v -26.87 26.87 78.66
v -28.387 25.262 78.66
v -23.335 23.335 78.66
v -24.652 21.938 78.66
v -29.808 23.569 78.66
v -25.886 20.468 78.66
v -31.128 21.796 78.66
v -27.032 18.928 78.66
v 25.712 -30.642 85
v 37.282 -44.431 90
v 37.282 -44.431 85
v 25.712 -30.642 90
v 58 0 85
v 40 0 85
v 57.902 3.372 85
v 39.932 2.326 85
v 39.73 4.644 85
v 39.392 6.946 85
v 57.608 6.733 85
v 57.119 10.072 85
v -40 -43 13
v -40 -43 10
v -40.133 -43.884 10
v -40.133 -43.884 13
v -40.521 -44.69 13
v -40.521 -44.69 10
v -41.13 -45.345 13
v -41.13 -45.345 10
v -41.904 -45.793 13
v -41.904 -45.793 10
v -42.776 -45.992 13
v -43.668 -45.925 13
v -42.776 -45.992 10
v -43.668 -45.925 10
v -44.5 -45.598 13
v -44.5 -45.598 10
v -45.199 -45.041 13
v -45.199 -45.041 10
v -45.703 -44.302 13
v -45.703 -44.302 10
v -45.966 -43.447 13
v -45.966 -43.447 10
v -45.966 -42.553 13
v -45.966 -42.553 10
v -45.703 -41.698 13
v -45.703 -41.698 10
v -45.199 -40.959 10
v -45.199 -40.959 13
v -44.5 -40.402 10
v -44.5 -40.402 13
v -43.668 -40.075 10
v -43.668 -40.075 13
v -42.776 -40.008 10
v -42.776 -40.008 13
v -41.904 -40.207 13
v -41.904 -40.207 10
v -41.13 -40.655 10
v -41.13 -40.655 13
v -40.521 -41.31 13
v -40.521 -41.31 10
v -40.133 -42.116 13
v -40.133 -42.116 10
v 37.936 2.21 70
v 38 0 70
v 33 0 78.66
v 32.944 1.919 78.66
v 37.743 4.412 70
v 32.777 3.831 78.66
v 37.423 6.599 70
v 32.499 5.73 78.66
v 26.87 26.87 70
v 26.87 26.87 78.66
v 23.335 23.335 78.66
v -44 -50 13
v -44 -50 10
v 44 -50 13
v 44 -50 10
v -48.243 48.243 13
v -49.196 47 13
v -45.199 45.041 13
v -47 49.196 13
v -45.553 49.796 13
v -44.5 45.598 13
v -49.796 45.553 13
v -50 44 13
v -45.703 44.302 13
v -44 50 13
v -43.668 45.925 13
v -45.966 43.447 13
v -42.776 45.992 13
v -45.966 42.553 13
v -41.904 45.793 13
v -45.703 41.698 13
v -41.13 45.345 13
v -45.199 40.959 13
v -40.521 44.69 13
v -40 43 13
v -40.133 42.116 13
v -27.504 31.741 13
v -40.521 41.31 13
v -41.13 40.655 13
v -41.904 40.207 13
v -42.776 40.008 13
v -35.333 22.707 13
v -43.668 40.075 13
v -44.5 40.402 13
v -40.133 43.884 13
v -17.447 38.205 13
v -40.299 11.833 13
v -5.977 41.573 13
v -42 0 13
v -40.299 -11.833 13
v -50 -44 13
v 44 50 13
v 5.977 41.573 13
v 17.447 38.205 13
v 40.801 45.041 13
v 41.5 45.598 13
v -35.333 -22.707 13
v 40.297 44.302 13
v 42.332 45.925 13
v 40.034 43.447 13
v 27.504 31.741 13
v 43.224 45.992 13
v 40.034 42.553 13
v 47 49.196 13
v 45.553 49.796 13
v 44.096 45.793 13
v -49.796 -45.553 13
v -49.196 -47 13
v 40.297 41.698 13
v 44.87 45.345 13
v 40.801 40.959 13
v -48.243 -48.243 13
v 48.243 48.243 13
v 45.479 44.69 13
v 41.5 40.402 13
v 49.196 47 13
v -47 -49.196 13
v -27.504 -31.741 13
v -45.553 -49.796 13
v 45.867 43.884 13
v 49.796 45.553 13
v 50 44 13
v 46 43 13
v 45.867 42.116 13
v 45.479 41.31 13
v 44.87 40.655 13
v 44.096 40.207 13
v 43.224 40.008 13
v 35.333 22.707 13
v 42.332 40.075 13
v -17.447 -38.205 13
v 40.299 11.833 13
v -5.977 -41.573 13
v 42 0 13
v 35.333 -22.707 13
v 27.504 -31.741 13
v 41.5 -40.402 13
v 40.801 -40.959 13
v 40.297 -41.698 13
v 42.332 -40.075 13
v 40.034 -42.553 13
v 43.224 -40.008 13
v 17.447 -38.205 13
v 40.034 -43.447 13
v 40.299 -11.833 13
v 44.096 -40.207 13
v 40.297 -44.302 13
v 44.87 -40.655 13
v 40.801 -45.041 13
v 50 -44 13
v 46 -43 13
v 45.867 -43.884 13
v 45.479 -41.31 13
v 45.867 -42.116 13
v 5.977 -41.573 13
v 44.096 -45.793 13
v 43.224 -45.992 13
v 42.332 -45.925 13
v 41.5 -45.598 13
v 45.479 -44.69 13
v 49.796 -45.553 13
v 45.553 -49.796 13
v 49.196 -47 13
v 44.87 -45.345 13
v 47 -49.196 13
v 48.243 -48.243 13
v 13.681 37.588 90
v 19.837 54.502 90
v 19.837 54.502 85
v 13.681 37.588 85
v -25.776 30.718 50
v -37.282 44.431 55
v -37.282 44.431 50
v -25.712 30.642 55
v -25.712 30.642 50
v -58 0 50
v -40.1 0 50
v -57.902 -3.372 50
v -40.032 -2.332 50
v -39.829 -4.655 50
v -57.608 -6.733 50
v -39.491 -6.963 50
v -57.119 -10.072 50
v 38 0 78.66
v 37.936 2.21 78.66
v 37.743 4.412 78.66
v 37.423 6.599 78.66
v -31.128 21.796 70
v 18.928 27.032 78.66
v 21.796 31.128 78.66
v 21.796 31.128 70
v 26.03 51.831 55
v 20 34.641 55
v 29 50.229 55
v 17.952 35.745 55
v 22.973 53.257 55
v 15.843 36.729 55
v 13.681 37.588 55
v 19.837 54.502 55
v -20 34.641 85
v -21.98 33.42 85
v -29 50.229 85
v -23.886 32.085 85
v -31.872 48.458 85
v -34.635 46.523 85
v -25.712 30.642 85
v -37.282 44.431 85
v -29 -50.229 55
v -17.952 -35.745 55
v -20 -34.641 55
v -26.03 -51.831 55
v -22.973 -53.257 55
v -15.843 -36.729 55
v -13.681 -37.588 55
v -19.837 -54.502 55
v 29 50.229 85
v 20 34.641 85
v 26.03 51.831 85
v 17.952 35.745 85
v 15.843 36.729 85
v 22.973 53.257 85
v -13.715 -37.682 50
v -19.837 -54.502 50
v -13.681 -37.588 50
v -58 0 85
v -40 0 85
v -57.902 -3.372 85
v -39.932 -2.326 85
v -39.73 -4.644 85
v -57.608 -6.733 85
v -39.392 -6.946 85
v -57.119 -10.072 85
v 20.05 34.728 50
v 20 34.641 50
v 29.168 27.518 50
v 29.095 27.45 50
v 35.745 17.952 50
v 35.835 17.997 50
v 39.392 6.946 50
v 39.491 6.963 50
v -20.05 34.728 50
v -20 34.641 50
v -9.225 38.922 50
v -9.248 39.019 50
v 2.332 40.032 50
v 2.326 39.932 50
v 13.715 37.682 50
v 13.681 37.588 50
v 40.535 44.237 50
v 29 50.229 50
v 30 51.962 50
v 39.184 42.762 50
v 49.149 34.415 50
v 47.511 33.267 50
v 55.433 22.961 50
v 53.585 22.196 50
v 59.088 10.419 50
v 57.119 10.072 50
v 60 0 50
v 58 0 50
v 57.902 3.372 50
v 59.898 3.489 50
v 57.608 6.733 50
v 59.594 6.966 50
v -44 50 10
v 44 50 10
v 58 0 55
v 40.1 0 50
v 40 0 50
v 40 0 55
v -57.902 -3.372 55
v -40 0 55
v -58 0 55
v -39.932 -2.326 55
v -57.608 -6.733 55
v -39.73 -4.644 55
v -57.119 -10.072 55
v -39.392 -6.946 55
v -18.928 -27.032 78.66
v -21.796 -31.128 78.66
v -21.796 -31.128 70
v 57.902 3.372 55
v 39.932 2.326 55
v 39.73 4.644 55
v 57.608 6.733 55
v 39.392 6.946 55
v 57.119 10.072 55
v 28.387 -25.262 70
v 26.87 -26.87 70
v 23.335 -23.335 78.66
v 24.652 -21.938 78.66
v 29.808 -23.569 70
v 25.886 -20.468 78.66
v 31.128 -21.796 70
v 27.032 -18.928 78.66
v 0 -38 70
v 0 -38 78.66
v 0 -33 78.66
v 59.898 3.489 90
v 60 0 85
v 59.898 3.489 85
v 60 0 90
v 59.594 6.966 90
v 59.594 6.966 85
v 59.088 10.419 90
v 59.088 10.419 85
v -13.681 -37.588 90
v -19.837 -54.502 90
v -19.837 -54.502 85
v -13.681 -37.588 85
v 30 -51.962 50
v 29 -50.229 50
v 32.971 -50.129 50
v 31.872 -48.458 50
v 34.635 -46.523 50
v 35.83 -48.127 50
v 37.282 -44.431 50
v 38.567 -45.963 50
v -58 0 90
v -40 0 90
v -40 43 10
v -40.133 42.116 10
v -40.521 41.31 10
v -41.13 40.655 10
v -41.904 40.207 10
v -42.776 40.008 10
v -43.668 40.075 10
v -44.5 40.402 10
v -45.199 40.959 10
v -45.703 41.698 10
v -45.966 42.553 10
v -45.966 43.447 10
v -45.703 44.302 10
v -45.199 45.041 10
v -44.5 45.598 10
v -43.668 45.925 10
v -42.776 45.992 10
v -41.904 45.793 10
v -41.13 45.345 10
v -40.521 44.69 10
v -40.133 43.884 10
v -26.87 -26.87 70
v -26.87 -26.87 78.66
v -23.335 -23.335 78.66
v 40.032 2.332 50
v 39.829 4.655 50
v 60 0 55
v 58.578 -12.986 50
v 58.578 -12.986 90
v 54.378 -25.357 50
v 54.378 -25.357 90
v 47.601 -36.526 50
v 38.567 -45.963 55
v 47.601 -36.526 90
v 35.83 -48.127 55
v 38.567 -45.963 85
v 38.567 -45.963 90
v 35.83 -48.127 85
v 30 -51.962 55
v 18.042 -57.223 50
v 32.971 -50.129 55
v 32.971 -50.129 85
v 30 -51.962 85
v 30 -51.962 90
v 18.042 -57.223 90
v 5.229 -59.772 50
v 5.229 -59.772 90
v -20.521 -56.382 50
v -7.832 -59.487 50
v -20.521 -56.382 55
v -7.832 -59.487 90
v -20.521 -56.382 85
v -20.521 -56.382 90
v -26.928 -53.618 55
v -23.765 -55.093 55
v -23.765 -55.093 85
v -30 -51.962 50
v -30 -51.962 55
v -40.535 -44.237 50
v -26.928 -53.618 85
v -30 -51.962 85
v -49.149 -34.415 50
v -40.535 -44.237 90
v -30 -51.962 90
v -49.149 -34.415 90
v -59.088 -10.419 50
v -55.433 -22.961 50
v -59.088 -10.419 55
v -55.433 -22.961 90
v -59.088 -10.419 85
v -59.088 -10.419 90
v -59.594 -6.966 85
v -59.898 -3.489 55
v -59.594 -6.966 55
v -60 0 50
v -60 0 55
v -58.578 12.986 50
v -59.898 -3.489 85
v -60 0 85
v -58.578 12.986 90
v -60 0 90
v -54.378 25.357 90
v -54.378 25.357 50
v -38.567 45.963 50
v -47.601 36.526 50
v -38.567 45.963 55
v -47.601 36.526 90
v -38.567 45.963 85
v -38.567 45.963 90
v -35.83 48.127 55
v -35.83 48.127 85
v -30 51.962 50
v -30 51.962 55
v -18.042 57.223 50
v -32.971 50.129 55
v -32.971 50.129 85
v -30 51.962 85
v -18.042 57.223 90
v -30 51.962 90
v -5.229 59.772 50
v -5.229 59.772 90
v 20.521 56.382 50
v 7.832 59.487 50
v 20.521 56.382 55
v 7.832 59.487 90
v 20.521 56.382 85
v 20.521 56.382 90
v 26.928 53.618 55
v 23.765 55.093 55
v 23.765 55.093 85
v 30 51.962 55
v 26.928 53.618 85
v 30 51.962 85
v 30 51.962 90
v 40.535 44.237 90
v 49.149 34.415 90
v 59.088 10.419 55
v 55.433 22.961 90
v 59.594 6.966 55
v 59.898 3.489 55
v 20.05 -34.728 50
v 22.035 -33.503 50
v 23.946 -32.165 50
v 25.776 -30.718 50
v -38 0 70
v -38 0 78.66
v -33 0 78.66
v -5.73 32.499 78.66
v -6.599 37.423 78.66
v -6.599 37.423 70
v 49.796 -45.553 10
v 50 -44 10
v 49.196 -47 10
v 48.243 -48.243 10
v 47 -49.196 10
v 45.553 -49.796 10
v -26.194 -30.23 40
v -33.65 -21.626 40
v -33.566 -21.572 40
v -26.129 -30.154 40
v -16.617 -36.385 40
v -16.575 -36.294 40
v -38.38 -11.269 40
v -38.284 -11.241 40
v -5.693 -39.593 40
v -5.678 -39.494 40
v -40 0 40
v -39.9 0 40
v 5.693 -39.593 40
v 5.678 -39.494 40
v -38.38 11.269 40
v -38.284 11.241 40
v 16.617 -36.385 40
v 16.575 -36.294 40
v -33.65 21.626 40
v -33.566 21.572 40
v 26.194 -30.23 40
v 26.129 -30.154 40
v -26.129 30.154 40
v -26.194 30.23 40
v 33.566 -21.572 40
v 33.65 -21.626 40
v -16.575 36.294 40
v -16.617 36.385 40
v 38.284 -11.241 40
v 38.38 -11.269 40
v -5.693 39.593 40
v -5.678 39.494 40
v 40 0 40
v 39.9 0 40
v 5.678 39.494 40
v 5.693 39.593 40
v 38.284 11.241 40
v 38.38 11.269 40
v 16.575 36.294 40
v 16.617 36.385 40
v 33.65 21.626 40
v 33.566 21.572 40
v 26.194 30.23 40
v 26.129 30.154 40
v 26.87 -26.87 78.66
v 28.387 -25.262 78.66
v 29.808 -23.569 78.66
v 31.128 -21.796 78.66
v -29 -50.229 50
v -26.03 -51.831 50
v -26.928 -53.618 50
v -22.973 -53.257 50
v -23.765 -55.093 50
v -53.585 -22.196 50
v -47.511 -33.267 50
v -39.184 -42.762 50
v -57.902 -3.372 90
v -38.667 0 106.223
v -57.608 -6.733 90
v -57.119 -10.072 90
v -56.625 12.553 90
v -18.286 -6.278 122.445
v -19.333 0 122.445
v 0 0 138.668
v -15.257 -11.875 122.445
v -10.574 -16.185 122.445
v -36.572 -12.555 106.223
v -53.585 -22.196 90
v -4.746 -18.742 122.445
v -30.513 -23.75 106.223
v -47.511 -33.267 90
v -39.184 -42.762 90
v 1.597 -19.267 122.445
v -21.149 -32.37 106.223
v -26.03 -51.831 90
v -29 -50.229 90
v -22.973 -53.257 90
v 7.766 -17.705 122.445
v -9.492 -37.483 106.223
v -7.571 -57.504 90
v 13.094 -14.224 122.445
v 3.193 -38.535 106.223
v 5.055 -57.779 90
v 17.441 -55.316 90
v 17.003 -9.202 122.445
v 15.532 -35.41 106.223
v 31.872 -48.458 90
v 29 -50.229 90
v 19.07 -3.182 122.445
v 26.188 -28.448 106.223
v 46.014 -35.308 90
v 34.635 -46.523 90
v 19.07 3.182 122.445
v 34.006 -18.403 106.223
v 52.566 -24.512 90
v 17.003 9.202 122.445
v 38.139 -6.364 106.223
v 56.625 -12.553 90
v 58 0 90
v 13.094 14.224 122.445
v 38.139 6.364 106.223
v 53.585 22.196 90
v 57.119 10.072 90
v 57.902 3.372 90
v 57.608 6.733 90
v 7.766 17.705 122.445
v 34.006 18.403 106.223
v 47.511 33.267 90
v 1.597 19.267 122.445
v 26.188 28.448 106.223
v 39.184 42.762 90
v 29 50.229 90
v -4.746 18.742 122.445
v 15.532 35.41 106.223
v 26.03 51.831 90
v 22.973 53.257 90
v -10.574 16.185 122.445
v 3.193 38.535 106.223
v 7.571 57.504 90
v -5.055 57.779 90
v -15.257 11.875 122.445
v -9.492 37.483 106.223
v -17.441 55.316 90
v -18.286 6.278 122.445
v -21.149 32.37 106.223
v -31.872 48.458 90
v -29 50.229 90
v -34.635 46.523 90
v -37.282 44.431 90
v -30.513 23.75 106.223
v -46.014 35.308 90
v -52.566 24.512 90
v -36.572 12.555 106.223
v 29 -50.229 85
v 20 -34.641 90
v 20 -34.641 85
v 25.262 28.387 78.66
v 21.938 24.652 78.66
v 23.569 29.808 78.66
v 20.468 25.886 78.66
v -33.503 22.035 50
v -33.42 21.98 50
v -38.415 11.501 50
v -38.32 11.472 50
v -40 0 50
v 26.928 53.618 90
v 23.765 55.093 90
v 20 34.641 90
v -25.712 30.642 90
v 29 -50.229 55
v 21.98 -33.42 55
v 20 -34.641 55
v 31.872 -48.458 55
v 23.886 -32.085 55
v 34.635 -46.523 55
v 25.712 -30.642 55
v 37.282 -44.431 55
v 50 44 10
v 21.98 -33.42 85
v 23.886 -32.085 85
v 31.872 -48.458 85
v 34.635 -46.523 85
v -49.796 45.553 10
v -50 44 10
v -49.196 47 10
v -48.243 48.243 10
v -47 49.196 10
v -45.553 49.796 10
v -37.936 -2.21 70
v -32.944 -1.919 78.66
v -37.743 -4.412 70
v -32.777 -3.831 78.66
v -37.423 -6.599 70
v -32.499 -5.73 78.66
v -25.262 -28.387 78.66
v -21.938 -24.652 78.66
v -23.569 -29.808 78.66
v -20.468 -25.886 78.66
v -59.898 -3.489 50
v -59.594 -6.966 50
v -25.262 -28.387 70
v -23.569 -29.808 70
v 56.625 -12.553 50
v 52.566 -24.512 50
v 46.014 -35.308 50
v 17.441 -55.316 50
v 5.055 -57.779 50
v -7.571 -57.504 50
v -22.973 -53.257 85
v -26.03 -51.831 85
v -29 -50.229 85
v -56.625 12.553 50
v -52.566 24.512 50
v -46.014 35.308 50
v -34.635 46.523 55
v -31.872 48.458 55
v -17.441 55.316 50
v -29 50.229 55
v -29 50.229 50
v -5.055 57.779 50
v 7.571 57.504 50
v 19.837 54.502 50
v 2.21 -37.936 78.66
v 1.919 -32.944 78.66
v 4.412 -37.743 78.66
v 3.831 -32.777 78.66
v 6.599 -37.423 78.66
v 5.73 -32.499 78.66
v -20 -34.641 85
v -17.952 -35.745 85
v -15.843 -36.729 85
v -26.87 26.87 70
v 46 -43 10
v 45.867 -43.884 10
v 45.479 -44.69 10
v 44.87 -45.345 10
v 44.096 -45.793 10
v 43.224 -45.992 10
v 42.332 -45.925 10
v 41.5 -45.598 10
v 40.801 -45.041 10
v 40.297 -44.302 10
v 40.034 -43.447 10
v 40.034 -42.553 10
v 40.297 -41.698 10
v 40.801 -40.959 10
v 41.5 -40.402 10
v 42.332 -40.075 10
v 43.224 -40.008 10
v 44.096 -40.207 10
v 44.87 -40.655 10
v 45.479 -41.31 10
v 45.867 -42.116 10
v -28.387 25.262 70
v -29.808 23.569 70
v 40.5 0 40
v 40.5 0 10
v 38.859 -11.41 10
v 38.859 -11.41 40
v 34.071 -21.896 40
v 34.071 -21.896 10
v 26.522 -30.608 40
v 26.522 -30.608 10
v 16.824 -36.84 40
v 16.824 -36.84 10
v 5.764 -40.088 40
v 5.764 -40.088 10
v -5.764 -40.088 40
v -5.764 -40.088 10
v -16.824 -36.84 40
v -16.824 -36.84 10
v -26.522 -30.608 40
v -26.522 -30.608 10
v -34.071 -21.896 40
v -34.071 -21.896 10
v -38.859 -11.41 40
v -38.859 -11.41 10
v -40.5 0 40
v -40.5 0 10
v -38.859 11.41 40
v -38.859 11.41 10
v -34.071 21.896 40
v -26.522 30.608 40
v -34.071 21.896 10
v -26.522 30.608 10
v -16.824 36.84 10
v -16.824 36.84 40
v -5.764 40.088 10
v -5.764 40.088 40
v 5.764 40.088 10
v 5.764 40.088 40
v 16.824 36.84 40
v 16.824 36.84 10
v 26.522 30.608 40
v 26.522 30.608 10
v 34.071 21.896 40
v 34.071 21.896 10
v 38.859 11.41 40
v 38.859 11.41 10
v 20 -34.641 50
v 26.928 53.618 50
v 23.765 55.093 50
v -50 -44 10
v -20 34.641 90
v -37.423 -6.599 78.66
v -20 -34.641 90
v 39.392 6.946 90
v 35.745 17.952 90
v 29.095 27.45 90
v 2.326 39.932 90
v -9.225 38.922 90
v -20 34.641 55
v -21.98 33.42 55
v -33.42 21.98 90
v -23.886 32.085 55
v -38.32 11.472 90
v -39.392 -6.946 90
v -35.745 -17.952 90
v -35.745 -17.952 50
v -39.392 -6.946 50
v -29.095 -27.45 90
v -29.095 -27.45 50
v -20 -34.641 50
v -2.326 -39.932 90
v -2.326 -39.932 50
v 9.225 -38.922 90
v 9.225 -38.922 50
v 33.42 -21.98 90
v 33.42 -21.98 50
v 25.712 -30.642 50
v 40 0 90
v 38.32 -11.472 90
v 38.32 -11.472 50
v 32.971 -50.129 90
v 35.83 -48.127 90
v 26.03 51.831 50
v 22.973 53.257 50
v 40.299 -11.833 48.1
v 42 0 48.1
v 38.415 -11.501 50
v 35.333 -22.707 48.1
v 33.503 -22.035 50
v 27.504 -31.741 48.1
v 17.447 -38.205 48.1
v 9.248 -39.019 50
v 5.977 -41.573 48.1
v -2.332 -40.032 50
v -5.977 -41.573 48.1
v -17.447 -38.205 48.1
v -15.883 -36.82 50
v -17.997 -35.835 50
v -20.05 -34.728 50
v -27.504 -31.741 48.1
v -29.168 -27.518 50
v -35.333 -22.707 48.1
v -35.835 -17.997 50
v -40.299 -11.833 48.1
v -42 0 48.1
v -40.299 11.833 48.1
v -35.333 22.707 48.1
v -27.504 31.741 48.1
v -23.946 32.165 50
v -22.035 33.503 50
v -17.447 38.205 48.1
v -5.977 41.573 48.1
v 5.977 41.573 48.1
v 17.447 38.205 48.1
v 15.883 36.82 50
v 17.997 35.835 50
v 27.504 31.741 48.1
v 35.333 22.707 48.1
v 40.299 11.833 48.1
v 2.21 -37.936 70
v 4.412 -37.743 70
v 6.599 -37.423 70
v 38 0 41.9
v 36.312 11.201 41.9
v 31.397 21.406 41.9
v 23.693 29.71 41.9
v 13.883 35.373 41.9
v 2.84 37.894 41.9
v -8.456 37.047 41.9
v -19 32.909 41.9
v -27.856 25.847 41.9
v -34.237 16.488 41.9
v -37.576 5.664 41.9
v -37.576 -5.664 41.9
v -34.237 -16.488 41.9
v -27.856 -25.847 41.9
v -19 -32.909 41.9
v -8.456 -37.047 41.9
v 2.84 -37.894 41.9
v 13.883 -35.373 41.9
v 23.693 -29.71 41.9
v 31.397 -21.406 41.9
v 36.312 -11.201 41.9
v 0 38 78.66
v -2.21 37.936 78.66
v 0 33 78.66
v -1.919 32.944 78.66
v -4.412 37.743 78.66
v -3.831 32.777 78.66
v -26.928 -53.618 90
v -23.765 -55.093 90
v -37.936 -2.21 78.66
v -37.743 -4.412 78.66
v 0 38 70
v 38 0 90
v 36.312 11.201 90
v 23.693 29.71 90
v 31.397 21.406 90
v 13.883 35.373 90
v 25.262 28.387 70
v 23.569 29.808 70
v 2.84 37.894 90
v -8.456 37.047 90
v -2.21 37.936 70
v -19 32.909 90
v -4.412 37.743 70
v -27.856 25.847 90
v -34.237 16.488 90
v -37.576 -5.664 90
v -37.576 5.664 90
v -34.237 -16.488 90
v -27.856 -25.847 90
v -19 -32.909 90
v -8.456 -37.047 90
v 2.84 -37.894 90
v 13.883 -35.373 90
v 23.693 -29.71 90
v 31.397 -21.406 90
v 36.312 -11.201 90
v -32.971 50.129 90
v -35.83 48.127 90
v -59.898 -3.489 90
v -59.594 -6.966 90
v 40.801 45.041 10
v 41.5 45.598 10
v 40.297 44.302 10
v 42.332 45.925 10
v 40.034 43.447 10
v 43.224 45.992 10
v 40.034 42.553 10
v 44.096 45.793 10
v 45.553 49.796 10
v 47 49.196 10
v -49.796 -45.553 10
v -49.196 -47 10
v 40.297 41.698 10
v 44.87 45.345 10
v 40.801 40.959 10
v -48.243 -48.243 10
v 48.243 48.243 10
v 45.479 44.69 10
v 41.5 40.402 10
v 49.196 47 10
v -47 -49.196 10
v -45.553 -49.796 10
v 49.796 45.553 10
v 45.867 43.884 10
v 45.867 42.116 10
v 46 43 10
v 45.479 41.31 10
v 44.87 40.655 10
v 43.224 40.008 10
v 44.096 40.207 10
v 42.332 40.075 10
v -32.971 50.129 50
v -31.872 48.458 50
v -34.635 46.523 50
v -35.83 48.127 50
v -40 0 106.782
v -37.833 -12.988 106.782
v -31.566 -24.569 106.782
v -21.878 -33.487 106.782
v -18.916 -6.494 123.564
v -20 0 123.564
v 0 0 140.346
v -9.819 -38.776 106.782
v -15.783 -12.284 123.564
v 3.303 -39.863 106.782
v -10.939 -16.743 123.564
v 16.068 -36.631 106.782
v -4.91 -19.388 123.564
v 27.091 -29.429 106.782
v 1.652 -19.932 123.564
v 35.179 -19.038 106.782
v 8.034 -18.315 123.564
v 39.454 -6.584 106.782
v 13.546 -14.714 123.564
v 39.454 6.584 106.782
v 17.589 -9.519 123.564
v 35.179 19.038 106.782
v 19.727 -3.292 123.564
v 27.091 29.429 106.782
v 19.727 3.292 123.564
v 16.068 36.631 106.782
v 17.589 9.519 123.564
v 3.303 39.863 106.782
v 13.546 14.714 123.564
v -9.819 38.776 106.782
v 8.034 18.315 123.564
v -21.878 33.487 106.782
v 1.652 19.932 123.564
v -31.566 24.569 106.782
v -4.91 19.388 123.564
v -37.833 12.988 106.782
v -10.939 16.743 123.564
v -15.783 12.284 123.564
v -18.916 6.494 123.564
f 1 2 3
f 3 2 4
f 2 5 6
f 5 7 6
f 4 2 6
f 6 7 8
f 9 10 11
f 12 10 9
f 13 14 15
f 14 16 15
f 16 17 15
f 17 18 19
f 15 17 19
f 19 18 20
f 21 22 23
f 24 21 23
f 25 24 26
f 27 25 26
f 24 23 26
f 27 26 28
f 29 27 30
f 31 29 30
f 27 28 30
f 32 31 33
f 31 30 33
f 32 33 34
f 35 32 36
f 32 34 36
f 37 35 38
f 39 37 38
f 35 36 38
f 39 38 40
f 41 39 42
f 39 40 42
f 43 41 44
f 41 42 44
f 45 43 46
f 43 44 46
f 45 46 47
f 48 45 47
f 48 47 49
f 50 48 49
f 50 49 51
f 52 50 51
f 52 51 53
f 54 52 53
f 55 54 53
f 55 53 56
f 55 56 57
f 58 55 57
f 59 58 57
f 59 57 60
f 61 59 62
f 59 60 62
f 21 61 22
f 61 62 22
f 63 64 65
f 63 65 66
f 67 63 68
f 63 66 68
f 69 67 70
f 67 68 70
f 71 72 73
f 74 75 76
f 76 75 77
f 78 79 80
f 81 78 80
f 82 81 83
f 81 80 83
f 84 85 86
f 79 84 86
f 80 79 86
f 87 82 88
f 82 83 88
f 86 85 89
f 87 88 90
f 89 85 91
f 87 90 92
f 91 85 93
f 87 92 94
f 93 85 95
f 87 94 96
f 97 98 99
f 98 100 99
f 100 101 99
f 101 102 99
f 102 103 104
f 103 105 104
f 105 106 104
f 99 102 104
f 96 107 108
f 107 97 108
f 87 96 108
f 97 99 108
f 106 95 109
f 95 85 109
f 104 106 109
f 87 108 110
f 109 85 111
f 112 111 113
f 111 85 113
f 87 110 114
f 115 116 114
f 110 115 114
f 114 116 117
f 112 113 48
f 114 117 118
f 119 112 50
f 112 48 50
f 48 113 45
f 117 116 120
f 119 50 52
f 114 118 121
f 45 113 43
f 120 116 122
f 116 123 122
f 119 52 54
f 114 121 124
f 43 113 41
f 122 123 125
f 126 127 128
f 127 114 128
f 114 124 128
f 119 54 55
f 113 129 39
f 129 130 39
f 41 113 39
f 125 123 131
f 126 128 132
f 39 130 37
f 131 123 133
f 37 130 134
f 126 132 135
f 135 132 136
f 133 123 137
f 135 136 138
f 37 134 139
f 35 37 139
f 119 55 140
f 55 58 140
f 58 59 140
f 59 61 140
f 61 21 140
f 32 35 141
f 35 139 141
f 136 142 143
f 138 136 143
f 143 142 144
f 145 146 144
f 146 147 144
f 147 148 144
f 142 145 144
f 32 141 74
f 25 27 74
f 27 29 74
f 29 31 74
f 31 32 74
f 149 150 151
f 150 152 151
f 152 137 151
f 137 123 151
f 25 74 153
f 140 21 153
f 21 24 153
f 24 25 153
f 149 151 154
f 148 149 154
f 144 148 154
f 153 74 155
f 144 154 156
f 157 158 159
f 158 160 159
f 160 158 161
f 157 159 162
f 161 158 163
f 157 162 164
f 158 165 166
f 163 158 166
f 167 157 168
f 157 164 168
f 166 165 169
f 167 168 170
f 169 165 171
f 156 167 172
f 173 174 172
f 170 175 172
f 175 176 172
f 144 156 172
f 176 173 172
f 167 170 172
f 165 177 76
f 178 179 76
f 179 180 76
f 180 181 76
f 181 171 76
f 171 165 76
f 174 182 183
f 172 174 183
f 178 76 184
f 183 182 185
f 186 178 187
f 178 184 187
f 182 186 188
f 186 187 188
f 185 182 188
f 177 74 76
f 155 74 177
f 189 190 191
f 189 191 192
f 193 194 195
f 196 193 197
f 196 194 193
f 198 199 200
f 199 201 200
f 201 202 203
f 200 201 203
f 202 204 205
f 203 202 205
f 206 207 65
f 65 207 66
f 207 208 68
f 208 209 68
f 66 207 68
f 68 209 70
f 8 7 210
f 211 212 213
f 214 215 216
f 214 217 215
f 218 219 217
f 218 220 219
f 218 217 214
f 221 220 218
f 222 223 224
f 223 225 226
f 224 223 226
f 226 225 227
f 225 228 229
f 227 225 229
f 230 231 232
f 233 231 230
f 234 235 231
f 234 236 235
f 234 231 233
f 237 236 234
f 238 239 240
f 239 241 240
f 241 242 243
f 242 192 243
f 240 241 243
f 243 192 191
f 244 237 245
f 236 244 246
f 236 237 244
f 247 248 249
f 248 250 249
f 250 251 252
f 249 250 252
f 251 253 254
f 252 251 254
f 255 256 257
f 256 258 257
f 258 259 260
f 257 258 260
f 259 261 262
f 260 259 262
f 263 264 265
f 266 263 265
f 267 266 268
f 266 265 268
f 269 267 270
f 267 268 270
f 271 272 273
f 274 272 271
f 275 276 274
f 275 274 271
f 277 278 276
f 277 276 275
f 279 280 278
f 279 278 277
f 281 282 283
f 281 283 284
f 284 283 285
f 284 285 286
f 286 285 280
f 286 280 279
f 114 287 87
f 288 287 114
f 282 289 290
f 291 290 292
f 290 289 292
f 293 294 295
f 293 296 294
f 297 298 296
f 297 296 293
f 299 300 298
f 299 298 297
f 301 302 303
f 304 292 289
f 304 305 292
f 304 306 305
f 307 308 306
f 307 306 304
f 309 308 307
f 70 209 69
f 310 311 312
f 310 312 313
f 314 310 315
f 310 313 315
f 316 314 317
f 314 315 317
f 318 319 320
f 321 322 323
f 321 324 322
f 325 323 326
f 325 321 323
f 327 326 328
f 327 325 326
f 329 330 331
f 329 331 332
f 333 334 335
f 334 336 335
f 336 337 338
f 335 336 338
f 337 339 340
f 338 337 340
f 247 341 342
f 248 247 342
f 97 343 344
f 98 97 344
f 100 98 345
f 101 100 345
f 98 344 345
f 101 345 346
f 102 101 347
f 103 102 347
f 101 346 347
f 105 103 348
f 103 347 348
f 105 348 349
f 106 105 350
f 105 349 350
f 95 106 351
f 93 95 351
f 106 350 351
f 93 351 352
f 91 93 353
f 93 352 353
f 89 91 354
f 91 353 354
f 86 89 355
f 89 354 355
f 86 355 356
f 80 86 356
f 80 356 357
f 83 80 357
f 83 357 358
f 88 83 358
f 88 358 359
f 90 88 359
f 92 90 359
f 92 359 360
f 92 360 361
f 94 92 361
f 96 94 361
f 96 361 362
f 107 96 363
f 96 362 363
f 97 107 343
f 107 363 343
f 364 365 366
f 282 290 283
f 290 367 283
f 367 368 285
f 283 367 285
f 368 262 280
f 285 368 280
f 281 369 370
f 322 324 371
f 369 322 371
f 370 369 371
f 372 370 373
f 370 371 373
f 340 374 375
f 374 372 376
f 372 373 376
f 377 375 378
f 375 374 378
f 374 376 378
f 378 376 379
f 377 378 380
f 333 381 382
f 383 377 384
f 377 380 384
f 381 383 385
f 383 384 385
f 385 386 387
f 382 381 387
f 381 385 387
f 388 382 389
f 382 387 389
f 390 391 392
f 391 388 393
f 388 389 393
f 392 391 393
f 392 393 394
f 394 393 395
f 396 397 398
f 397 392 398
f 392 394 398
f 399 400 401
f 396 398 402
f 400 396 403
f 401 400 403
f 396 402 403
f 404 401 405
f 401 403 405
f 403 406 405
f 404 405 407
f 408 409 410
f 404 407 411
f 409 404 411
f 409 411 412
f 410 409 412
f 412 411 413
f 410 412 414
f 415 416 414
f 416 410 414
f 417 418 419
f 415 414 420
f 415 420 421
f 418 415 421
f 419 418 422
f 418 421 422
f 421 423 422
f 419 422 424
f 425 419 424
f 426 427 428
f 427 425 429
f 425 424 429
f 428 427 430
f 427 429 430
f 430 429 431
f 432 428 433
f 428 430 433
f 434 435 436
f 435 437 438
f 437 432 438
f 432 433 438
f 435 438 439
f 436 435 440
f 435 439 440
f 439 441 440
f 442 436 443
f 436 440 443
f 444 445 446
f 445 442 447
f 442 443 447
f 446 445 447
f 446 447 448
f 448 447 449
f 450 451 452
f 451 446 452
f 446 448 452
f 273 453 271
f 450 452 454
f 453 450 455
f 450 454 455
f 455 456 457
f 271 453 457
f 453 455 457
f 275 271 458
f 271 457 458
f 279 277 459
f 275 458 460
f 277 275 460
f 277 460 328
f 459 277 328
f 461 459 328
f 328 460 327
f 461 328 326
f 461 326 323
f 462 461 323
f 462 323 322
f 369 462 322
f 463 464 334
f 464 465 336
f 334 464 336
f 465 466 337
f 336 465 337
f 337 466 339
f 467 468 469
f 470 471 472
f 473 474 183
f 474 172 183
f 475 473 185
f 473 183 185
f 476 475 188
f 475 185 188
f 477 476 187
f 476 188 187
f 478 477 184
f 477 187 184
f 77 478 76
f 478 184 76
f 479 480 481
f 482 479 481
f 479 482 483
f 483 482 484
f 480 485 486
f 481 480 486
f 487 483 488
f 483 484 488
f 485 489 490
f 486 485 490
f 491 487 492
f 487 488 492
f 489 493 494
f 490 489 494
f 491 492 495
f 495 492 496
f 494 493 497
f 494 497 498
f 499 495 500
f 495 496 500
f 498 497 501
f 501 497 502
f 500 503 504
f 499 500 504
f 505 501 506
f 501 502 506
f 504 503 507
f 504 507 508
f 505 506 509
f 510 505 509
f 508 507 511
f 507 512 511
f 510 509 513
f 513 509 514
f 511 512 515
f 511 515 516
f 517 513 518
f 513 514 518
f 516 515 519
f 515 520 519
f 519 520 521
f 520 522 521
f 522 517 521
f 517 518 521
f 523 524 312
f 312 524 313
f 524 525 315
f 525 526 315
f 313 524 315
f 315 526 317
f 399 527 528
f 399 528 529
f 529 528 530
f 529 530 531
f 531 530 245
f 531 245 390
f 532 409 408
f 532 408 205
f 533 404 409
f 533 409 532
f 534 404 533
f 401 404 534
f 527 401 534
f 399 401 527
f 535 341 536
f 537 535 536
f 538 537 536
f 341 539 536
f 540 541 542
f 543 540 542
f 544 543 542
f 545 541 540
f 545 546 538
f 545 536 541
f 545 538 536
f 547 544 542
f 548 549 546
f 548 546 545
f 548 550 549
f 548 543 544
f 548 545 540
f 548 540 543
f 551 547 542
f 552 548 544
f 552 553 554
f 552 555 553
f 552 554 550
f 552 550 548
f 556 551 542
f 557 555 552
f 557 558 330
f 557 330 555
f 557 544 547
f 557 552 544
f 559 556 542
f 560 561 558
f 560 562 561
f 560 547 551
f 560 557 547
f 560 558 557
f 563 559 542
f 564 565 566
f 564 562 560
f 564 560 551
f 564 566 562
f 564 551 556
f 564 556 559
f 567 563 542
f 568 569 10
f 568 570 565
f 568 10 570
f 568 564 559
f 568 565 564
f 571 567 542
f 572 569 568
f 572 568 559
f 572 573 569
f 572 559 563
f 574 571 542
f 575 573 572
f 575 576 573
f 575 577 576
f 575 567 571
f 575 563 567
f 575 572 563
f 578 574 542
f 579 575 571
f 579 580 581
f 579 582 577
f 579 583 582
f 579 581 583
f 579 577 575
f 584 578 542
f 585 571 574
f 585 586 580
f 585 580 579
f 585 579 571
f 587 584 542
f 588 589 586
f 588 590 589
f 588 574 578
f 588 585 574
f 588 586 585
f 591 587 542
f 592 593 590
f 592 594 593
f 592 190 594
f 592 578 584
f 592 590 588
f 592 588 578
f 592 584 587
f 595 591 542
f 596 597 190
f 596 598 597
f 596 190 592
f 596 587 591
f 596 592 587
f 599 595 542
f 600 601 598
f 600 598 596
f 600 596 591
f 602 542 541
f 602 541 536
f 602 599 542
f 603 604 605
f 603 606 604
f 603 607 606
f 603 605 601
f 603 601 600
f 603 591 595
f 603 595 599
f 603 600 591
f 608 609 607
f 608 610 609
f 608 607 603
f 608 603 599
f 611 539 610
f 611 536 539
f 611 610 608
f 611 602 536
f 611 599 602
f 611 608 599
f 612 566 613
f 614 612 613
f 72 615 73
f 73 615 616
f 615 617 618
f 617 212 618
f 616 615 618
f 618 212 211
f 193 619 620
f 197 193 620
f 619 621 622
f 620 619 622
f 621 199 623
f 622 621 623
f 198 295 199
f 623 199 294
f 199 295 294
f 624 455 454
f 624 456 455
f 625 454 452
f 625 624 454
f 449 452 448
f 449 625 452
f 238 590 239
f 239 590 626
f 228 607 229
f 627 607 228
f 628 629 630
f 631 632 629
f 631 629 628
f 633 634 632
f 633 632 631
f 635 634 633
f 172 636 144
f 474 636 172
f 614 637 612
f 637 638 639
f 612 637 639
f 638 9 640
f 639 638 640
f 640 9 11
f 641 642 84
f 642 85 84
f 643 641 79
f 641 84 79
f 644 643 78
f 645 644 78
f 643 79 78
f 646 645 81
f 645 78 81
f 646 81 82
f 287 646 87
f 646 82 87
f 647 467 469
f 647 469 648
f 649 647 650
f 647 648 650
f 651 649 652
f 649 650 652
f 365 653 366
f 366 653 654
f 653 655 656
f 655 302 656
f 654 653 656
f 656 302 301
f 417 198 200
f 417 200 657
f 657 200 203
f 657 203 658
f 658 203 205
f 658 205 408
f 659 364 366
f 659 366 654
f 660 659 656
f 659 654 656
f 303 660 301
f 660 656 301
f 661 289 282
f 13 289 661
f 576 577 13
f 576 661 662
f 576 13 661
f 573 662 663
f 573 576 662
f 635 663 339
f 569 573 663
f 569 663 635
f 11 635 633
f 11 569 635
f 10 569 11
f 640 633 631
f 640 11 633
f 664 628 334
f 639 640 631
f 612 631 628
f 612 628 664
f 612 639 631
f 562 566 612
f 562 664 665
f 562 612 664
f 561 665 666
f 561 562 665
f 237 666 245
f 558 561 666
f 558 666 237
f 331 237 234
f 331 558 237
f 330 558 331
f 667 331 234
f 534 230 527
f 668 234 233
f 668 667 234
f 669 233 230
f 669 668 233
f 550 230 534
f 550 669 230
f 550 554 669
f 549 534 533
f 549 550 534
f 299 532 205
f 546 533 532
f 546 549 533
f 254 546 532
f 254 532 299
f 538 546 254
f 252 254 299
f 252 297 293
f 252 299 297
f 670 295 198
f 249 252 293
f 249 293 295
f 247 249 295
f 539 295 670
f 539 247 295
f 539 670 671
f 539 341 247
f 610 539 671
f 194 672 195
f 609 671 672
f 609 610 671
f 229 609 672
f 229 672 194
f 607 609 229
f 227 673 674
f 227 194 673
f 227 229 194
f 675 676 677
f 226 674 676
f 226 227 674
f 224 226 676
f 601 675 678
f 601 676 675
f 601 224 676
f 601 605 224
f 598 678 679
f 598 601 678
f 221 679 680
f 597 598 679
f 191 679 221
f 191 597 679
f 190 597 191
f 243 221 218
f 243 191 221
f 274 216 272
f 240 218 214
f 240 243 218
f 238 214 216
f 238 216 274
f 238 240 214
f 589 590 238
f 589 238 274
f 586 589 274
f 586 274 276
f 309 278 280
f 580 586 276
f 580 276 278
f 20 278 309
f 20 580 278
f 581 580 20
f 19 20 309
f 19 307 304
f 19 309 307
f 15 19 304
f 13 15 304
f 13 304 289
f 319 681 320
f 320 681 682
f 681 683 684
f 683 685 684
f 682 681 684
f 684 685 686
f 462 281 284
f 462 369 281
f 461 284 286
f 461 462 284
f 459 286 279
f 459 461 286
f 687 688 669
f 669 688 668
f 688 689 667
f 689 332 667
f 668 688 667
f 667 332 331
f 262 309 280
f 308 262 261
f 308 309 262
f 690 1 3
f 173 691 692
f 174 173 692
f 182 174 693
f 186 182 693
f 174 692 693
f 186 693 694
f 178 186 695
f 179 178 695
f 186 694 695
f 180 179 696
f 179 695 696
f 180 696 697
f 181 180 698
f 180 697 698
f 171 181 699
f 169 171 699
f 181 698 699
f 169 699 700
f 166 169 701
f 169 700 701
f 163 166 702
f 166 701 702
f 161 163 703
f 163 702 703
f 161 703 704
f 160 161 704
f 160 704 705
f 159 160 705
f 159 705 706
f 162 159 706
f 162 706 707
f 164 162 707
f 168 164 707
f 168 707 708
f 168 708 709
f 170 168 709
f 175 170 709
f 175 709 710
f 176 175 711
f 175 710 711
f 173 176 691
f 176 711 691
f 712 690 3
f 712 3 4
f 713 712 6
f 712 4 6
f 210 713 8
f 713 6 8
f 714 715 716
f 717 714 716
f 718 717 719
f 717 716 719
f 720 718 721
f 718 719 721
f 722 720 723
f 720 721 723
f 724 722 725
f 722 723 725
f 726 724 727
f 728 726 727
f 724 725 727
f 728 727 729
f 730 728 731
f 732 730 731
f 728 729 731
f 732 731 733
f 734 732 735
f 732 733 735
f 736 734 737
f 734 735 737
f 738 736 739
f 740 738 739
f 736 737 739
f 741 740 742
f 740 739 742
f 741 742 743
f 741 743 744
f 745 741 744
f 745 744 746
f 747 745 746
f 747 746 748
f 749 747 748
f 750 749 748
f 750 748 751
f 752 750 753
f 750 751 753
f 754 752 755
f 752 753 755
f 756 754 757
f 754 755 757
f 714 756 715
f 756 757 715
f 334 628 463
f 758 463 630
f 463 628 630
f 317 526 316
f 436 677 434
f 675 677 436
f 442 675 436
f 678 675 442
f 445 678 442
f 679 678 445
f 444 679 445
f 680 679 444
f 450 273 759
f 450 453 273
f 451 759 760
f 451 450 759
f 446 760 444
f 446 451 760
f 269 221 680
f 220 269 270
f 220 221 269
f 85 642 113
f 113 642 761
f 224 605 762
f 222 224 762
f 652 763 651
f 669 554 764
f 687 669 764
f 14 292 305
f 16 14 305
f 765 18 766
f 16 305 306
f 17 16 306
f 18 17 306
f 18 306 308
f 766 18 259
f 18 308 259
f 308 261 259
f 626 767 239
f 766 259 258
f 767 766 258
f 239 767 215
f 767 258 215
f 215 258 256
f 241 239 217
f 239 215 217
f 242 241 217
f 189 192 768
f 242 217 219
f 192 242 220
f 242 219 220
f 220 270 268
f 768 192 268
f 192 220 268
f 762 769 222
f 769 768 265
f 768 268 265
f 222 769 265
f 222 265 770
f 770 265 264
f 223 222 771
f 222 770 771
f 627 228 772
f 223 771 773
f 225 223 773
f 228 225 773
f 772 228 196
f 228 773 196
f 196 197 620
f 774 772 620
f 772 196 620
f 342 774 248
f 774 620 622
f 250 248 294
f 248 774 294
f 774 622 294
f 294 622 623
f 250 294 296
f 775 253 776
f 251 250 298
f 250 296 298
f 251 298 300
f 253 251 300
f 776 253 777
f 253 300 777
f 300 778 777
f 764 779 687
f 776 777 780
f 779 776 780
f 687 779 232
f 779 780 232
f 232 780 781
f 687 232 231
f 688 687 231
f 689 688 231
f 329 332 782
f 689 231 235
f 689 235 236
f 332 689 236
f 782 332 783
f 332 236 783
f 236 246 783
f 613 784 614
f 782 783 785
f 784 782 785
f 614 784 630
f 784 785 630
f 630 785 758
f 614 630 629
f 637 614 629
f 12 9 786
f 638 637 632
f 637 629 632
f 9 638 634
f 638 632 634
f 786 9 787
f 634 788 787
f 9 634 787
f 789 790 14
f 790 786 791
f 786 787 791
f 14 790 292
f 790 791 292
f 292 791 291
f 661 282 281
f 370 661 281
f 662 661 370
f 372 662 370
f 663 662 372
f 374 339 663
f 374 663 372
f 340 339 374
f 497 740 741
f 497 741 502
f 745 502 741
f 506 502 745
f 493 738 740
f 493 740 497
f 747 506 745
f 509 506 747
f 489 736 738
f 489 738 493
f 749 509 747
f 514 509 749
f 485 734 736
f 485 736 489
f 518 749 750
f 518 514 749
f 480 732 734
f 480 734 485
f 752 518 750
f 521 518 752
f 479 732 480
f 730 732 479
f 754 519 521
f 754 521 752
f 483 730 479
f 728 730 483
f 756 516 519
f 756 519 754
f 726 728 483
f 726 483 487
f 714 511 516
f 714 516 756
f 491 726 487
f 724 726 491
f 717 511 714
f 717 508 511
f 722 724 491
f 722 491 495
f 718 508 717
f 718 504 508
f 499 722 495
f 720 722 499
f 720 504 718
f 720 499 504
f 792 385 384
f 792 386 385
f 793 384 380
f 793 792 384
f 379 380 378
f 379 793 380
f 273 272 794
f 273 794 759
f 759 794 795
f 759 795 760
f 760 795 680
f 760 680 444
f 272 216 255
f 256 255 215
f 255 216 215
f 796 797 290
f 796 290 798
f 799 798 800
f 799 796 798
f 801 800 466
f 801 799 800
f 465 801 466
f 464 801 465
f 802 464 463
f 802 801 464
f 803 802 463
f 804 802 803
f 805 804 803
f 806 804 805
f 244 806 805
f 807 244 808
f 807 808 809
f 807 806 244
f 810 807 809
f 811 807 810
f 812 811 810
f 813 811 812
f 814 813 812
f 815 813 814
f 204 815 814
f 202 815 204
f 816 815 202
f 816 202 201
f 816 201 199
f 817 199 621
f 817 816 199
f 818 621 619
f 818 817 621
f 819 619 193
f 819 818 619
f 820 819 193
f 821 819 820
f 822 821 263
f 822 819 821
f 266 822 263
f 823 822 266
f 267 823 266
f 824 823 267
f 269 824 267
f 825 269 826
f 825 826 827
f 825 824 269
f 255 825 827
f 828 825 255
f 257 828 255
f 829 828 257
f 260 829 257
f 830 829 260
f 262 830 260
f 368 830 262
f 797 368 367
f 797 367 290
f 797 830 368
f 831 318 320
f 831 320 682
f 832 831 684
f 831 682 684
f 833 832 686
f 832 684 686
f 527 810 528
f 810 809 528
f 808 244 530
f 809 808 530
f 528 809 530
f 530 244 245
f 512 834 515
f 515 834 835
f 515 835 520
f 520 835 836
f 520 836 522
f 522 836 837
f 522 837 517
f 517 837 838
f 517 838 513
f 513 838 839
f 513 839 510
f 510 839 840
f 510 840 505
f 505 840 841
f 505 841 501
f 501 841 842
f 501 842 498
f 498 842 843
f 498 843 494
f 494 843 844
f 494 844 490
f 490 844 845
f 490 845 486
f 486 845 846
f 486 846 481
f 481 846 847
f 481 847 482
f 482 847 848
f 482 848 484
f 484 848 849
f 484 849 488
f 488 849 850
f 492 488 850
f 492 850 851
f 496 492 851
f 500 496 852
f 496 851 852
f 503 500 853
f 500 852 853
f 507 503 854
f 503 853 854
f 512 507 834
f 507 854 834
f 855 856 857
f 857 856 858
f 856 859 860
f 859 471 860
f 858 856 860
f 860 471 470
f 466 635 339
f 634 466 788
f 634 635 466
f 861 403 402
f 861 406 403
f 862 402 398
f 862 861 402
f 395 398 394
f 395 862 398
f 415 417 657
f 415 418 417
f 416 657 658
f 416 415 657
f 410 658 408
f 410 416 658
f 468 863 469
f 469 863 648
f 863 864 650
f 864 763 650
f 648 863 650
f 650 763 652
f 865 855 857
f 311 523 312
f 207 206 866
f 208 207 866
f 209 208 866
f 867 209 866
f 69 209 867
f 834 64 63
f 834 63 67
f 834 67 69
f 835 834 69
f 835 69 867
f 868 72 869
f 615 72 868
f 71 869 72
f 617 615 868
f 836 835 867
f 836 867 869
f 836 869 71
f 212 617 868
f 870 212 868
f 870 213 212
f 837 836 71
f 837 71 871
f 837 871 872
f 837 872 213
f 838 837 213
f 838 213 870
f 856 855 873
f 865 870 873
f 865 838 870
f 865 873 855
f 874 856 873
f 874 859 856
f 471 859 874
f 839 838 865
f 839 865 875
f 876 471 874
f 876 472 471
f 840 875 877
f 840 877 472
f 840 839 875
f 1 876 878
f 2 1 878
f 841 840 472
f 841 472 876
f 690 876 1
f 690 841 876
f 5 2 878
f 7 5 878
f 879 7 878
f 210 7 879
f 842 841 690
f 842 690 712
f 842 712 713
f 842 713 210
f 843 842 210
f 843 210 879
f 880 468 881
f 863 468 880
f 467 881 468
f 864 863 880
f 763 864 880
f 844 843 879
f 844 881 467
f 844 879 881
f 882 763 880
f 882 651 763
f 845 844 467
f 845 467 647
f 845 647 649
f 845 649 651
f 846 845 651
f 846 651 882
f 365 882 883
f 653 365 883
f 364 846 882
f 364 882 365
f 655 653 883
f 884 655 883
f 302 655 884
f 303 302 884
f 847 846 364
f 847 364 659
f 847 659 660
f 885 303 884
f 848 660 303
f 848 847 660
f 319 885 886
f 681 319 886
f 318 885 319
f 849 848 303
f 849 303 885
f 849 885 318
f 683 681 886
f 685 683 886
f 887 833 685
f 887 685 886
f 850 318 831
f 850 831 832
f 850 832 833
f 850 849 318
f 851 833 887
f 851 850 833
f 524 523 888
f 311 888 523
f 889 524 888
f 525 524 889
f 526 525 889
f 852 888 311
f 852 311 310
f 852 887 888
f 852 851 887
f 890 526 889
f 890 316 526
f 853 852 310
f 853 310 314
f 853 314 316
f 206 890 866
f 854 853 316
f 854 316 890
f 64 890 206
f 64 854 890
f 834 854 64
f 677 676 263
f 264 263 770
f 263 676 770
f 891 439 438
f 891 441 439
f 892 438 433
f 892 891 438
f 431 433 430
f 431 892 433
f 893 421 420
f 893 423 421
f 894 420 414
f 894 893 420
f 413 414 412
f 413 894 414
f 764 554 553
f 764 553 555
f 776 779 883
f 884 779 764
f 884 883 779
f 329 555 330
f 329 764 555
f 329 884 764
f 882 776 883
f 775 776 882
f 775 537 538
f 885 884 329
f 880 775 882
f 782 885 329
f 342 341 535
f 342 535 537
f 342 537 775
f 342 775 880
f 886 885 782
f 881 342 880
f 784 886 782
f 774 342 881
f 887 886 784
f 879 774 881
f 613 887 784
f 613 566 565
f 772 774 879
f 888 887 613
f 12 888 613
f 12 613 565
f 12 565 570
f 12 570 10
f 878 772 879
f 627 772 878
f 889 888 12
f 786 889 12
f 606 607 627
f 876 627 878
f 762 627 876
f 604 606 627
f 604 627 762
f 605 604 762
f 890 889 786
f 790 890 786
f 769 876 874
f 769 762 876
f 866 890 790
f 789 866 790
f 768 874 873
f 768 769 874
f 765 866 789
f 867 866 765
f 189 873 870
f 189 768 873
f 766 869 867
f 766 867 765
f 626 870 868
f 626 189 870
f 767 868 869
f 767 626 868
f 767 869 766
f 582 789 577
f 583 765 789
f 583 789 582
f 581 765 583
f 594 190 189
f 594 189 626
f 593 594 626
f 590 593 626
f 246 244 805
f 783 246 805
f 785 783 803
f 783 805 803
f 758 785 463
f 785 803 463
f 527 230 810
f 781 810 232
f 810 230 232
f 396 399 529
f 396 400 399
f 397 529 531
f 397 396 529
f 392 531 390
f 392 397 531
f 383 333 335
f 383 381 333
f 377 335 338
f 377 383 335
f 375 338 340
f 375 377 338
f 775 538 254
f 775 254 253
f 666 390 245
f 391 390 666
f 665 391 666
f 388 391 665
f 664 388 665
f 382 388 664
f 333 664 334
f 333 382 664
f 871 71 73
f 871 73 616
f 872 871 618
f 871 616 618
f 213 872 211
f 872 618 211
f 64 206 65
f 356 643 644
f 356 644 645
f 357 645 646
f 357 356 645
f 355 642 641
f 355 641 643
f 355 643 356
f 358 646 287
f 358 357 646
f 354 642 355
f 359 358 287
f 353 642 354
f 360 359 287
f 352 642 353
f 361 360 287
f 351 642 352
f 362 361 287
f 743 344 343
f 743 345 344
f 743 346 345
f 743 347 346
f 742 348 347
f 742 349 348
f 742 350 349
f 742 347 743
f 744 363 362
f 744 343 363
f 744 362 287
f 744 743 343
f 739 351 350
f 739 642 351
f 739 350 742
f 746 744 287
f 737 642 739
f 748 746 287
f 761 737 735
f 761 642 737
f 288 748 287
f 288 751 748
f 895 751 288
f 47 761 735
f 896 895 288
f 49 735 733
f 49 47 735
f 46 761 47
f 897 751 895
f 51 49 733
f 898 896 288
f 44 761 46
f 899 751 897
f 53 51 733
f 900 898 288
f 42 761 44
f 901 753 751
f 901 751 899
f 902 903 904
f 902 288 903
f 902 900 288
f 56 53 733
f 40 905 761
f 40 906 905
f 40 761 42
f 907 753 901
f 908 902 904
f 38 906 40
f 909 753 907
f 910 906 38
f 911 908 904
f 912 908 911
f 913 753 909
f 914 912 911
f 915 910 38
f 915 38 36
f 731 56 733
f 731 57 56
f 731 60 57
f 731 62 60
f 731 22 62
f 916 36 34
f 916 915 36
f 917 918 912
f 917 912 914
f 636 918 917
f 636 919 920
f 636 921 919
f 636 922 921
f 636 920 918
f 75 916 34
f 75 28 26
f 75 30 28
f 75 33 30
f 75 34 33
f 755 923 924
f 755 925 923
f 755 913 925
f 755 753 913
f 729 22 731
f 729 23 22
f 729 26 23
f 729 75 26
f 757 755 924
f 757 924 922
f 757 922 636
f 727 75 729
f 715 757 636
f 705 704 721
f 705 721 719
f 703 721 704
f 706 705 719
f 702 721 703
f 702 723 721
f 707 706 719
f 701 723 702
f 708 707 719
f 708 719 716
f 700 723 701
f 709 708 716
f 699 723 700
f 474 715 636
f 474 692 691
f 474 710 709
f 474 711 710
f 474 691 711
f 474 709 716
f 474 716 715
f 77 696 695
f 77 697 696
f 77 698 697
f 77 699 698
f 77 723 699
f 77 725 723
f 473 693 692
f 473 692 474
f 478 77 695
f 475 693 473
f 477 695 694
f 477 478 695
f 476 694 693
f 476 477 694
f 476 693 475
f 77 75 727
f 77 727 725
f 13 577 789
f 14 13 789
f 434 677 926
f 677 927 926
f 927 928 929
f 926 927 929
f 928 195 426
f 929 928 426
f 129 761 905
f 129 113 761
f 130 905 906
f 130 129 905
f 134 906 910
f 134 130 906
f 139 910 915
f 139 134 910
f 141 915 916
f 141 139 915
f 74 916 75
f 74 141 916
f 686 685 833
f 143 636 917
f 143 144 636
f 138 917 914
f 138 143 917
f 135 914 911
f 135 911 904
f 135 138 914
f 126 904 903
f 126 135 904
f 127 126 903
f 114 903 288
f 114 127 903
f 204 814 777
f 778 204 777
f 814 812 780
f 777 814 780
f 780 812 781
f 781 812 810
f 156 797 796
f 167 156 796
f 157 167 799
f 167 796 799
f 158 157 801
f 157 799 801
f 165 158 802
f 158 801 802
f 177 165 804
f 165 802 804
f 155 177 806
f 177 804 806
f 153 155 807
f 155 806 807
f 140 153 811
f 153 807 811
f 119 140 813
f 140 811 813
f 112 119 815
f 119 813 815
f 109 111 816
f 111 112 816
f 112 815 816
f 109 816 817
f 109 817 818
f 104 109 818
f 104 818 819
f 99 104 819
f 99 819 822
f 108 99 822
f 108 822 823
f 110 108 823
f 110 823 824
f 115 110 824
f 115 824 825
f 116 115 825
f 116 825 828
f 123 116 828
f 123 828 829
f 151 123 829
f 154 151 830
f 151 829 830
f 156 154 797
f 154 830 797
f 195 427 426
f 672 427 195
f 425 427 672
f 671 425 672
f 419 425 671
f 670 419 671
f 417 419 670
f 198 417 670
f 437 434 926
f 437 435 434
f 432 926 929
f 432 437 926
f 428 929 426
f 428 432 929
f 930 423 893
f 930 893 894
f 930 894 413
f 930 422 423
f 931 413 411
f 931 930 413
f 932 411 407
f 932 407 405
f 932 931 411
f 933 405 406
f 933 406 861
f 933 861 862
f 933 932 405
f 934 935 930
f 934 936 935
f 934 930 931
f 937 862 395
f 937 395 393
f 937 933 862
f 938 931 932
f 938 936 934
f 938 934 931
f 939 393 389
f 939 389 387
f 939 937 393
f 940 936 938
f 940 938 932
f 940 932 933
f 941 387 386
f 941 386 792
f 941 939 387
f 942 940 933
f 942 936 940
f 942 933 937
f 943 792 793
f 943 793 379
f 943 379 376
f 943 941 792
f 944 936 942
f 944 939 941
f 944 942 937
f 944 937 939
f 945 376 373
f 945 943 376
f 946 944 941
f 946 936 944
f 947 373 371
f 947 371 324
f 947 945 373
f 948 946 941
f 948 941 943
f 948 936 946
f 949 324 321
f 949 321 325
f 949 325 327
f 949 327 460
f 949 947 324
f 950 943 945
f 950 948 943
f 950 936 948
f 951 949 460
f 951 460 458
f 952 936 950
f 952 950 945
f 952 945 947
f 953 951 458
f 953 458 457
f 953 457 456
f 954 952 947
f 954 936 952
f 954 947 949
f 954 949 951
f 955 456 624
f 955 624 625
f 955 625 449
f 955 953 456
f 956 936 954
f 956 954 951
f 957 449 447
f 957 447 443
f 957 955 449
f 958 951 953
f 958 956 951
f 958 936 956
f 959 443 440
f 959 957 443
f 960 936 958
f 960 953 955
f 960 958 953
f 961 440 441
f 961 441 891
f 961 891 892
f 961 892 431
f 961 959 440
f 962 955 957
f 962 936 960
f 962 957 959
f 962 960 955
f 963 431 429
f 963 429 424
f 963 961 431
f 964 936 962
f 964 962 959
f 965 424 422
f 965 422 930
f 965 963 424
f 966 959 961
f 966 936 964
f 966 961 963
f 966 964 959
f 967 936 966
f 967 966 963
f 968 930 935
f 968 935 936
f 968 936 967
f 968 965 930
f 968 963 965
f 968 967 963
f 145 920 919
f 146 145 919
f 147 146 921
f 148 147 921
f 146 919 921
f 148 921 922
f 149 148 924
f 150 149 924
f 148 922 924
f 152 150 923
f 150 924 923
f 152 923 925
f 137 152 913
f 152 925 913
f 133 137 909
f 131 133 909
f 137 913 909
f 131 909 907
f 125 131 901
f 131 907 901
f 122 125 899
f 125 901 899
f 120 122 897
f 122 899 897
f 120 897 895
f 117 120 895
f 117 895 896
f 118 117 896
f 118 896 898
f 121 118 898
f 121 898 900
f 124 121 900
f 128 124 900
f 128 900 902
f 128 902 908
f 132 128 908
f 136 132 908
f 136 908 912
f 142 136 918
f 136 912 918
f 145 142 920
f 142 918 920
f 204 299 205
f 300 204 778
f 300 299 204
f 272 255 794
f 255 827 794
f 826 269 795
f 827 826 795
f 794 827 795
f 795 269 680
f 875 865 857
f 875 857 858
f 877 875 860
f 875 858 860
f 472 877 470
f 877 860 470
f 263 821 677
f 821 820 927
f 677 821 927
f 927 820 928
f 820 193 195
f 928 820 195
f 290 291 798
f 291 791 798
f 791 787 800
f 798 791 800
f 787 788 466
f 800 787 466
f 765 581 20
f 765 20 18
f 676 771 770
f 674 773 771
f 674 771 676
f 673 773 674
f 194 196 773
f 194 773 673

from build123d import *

# Parameters (mm, degrees)
SKETCH006_R           = 40
SKETCH006_R_2         = 38
PAD002_DEPTH          = 50
SKETCH007_R           = 42
SKETCH007_R_2         = 40
PAD003_DEPTH          = 40
SKETCH019_W           = 100
SKETCH019_H           = 100
SKETCH019_R           = 40
PAD010_DEPTH          = 3
FILLET001_R           = 6
SKETCH020_R           = 3
POCKET004_DEPTH       = 3
CHAMFER_SIZE          = 1.9
CHAMFER002_SIZE       = 1.9
REVOLUTION_ANGLE      = 10
POLARPATTERN_COUNT    = 8
SKETCH022_W           = 20
SKETCH022_H           = 5
REVOLUTION004_ANGLE   = 10
POLARPATTERN006_COUNT = 6
SKETCH024_R           = 60
SKETCH024_R_2         = 58
PAD011_DEPTH          = 40
SKETCH030_R           = 40.5
POCKET006_DEPTH       = 30


with BuildPart() as part:
    # Sketch006 → Pad002 (new body)
    with BuildSketch(Plane.XY):
        Circle(SKETCH006_R)
        Circle(SKETCH006_R_2, mode=Mode.SUBTRACT)
    extrude(amount=PAD002_DEPTH)

    # Sketch007 (on Face3 of Pad002) → Pad003 (join)
    with BuildSketch(Plane(origin=(0, 0, 10), x_dir=(1, 0, 0), z_dir=(0, 0, -1))):
        Circle(SKETCH007_R)
        Circle(SKETCH007_R_2, mode=Mode.SUBTRACT)
    extrude(amount=PAD003_DEPTH)

    # Sketch019 (on Face6 of Pad003) → Pad010 (join)
    with BuildSketch(Plane(origin=(0, 0, -30), x_dir=(1, 0, 0), z_dir=(0, 0, -1))):
        Rectangle(SKETCH019_W, SKETCH019_H)
        Circle(SKETCH019_R, mode=Mode.SUBTRACT)
    extrude(amount=-PAD010_DEPTH)

    # Fillet001
    fillet001_edges = [part.edges().sort_by_distance(p)[0] for p in [
        (-50, 50, -28.5),
        (-50, -50, -28.5),
        (50, -50, -28.5),
        (50, 50, -28.5),
    ]]
    fillet(fillet001_edges, radius=FILLET001_R)

    # Sketch020 (on Face11 of Fillet001) → Pocket004 (cut)
    with BuildSketch(Plane(origin=(0, 0, -30), x_dir=(1, 0, 0), z_dir=(0, 0, -1))):
        with Locations((-43, 43)):
            Circle(SKETCH020_R)
        with Locations((43, 43)):
            Circle(SKETCH020_R)
        with Locations((43, -43)):
            Circle(SKETCH020_R)
        with Locations((-43, -43)):
            Circle(SKETCH020_R)
    extrude(amount=-POCKET004_DEPTH, mode=Mode.SUBTRACT)

    # Chamfer
    chamfer_edges = [part.edges().sort_by_distance(p)[0] for p in [
        (-38, 0, 0),
    ]]
    chamfer(chamfer_edges, length=CHAMFER_SIZE)

    # Chamfer002
    chamfer002_edges = [part.edges().sort_by_distance(p)[0] for p in [
        (-42, 0, 10),
    ]]
    chamfer(chamfer002_edges, length=CHAMFER002_SIZE)

    # Sketch021 → Revolution (revolve)
    with BuildSketch(Plane.YZ):
        Polygon((-38, 38.660254), (-38, 30), (-33, 38.660254), align=None)
    revolution = revolve(axis=Axis((0, 0, 0), (0, 0, 1)), revolution_arc=REVOLUTION_ANGLE)

    # PolarPattern: Revolution ×8 about axis
    polarpattern_axis = Axis((0, 0, 0), (0, 0, 1))
    for i in range(1, POLARPATTERN_COUNT):
        add(revolution.rotate(polarpattern_axis, i * 360 / POLARPATTERN_COUNT))

    # Sketch022 → Revolution004 (revolve)
    with BuildSketch(Plane.XZ):
        with Locations((-50, 47.5)):
            Rectangle(SKETCH022_W, SKETCH022_H)
        with Locations((-50, 12.5)):
            Rectangle(SKETCH022_W, SKETCH022_H)
    revolution004 = revolve(axis=Axis((0, 0, 0), (0, 0, 1)), revolution_arc=REVOLUTION004_ANGLE)

    # PolarPattern006: Revolution004 ×6 about axis
    polarpattern006_axis = Axis((0, 0, 0), (0, 0, 1))
    for i in range(1, POLARPATTERN006_COUNT):
        add(revolution004.rotate(polarpattern006_axis, i * 360 / POLARPATTERN006_COUNT))

    # Sketch023 → Revolution005 (revolve)
    with BuildSketch(Plane.XZ):
        Polygon((-60, 50), (0, 100.345978), (0, 98.667779), (-58, 50), align=None)
    revolve(axis=Axis((0, 0, 0), (0, 0, 1)))

    # Sketch024 (on Face68 of Revolution005) → Pad011 (join)
    with BuildSketch(Plane(origin=(0, 0, 50), x_dir=(1, 0, 0), z_dir=(0, 0, -1))):
        Circle(SKETCH024_R)
        Circle(SKETCH024_R_2, mode=Mode.SUBTRACT)
    extrude(amount=PAD011_DEPTH)

    # Sketch030 (on Face135 of Pad011) → Pocket006 (cut)
    with BuildSketch(Plane(origin=(0, 0, -30), x_dir=(1, 0, 0), z_dir=(0, 0, -1))):
        Circle(SKETCH030_R)
    extrude(amount=-POCKET006_DEPTH, mode=Mode.SUBTRACT)


with BuildPart() as part_1:
    # Body001 placement: moved
    add(part.part.moved(Location((0, 0, 40))))


solid = part_1.part
